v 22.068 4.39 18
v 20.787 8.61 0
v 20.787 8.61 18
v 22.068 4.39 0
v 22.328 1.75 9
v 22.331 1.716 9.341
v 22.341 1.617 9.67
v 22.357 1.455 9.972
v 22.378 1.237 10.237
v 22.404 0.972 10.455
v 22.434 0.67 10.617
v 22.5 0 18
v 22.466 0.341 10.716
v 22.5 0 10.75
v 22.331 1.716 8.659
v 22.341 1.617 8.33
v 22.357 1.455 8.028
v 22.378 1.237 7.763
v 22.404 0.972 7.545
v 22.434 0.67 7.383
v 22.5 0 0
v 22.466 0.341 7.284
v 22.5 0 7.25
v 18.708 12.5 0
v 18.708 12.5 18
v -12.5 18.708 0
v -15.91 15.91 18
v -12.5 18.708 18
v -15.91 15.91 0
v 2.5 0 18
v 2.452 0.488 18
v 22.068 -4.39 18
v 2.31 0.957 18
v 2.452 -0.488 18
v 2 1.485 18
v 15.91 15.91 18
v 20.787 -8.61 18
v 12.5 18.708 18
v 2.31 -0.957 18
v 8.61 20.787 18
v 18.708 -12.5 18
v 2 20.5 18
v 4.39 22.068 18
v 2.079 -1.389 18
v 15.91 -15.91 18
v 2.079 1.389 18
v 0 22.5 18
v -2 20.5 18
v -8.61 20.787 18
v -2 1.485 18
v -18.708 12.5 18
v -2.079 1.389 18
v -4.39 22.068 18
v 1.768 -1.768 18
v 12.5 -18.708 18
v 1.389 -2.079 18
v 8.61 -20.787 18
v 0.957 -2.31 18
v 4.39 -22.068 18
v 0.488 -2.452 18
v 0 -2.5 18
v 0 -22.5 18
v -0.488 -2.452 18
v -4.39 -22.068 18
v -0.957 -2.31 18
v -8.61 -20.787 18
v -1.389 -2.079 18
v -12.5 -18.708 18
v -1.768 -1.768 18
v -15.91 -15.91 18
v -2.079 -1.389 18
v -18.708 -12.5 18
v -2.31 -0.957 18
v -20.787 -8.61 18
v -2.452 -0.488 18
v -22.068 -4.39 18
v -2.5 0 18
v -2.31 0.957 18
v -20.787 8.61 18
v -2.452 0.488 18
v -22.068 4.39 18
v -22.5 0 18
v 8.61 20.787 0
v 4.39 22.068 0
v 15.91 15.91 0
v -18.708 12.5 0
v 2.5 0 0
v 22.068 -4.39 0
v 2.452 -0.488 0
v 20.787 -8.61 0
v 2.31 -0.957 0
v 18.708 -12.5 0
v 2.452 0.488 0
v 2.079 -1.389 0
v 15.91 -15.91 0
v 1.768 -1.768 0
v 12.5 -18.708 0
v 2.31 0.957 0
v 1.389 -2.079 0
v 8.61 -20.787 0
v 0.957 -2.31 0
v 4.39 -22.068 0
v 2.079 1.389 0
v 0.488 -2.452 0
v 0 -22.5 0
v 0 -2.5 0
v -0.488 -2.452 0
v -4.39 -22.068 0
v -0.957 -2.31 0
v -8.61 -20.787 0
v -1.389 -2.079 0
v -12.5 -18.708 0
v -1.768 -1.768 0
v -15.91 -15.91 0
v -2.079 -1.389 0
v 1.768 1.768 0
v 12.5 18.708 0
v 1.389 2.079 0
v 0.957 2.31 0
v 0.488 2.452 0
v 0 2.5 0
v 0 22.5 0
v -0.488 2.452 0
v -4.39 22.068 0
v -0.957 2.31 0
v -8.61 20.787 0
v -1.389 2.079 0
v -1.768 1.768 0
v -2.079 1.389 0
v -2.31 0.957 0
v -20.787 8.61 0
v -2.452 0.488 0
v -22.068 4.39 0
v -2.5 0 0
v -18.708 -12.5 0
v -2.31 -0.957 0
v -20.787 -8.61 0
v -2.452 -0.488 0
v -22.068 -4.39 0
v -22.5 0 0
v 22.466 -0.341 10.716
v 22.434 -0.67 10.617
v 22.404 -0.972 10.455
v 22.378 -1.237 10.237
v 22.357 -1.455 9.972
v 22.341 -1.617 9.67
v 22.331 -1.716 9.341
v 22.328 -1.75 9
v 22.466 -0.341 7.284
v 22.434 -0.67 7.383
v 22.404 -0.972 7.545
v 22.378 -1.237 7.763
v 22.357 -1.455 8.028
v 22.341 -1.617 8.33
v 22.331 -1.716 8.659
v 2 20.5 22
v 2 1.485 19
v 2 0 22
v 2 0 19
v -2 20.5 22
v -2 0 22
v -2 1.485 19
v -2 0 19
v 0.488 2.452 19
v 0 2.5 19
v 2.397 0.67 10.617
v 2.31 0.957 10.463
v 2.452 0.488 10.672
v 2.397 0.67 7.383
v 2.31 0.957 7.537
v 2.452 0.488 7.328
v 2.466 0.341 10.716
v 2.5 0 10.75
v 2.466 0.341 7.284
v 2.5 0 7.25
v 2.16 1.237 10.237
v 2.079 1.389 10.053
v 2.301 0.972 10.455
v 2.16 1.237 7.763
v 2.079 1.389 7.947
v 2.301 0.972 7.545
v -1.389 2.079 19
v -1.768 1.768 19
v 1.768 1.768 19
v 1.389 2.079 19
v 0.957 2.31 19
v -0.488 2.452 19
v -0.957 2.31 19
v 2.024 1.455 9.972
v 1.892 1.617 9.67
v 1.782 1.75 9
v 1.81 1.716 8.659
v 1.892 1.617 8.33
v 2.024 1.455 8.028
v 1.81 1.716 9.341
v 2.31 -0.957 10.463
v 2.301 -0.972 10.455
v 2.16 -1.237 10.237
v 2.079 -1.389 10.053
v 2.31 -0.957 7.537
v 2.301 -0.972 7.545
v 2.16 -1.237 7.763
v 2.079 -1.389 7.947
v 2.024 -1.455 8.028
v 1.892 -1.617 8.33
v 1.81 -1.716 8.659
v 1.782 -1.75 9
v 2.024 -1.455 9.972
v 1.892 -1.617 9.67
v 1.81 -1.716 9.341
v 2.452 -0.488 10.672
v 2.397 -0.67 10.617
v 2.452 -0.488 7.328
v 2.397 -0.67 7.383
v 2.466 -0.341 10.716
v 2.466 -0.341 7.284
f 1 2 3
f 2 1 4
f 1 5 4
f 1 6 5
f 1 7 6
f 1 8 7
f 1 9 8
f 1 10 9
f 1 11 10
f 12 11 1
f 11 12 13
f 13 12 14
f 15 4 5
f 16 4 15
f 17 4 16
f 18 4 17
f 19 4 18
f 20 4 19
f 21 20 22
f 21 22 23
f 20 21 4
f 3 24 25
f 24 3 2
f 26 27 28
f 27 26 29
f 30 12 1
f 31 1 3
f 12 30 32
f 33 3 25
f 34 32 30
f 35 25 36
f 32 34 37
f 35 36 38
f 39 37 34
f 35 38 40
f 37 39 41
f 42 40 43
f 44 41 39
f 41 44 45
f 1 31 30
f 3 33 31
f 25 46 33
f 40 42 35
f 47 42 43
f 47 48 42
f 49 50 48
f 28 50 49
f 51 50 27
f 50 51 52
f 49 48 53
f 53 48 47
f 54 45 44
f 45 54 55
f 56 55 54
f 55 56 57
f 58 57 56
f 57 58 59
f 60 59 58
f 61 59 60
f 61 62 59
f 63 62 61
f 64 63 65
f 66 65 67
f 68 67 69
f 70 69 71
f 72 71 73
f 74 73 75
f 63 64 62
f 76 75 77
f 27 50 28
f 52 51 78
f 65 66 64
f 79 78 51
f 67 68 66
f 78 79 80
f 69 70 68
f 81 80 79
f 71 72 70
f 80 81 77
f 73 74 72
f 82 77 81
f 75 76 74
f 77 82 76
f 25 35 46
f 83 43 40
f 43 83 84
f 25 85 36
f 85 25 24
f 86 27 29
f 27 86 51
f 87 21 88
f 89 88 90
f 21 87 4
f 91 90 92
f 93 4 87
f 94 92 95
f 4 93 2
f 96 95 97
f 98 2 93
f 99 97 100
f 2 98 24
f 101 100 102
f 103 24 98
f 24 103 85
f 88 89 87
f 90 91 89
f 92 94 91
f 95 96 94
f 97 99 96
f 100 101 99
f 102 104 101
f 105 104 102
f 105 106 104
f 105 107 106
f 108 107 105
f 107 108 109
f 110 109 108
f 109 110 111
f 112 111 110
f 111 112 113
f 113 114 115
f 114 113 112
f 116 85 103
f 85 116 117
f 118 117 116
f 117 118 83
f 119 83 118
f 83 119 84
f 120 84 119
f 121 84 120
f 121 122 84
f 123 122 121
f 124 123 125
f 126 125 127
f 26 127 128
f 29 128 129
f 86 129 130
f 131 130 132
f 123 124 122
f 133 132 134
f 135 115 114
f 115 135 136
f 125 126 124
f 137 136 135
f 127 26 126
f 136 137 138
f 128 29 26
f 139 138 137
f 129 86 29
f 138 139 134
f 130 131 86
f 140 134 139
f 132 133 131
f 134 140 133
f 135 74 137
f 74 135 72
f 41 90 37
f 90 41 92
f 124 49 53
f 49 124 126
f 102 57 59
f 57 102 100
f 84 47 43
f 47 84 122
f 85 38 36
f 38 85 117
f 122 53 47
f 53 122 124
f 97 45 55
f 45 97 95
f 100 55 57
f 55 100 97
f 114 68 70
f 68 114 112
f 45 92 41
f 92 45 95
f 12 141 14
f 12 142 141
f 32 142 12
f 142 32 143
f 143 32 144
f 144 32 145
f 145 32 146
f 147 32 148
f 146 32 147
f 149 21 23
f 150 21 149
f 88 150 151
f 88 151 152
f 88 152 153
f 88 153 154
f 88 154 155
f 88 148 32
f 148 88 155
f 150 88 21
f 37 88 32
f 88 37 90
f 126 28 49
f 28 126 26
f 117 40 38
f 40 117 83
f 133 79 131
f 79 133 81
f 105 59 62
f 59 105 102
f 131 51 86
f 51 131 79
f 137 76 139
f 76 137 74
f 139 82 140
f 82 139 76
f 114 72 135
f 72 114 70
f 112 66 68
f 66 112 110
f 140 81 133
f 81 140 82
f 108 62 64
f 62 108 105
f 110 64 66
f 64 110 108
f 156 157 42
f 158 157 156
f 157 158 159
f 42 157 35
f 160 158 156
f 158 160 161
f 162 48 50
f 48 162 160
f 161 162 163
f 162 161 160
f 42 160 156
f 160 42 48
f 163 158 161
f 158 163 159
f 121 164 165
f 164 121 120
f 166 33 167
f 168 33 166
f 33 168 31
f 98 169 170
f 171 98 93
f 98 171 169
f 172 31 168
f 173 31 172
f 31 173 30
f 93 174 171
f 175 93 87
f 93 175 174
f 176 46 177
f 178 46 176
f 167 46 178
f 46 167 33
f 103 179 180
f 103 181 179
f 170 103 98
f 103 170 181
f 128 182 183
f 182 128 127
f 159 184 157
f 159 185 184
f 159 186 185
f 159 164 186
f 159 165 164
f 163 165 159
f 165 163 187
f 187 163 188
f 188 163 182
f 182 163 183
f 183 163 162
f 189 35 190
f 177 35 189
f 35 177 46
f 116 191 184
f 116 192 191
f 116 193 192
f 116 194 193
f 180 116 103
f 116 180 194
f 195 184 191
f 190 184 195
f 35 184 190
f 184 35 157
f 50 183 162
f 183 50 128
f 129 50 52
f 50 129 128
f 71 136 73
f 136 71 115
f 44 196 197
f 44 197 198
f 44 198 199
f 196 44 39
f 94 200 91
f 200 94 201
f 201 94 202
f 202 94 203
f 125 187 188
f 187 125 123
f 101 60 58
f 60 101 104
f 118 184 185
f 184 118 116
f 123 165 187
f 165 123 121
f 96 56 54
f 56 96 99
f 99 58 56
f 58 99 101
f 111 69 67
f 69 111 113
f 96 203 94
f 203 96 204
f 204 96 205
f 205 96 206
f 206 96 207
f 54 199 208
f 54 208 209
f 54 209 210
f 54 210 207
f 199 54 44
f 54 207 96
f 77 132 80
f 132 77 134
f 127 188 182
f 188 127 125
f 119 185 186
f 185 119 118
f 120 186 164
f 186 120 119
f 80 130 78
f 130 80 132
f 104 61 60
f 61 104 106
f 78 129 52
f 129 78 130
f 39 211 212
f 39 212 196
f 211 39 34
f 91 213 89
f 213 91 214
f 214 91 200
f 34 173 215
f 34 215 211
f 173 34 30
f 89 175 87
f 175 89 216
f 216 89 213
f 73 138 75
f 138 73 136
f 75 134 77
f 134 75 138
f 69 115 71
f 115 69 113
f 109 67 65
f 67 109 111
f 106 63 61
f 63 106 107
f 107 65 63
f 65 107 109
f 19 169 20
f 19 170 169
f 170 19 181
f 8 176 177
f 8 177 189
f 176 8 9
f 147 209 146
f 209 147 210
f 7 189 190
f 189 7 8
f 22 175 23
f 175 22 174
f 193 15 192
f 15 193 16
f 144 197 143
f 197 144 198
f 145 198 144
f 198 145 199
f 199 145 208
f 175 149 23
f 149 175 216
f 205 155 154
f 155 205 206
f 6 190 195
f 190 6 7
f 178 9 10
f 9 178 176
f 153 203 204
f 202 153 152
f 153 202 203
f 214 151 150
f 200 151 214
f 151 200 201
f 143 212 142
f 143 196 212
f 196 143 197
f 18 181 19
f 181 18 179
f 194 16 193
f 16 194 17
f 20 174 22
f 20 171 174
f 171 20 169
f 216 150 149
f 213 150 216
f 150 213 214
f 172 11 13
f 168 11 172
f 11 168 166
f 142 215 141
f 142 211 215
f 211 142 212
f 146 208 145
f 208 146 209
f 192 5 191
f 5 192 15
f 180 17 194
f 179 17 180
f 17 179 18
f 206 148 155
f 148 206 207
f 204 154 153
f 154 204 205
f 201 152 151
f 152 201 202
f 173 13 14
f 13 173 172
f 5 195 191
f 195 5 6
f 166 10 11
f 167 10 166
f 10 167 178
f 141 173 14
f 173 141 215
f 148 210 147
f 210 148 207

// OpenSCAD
$fn = 32;

// ----------------------------------------------------------------------
// Control knob: pointer knob
// ----------------------------------------------------------------------

// --- parameters (mm) ---
rib_w = 4;                // pointer rib width
rib_h = 5;                // pointer rib height
knob_d = 45;              // knob body diameter
knob_h = 18;              // knob body height
bore_d = 5;               // shaft bore diameter
set_d = 3.5;              // set screw bore diameter

rib_poke = rib_h - 1;  // rib height above the top
total_h = knob_h + rib_h - 1;  // overall height

difference() {
  union() {
    cylinder(h = knob_h, d = knob_d);
    translate([-rib_w / 2, 0, knob_h - 1])
      cube([rib_w, knob_d / 2 - 2, rib_h]);
  }
  translate([0, 0, -1]) cylinder(h = knob_h + 2, d = bore_d);
  translate([-1, 0, knob_h / 2]) rotate([0, 90, 0])
    cylinder(h = knob_d / 2 + bore_d / 2 + 2, d = set_d);}
